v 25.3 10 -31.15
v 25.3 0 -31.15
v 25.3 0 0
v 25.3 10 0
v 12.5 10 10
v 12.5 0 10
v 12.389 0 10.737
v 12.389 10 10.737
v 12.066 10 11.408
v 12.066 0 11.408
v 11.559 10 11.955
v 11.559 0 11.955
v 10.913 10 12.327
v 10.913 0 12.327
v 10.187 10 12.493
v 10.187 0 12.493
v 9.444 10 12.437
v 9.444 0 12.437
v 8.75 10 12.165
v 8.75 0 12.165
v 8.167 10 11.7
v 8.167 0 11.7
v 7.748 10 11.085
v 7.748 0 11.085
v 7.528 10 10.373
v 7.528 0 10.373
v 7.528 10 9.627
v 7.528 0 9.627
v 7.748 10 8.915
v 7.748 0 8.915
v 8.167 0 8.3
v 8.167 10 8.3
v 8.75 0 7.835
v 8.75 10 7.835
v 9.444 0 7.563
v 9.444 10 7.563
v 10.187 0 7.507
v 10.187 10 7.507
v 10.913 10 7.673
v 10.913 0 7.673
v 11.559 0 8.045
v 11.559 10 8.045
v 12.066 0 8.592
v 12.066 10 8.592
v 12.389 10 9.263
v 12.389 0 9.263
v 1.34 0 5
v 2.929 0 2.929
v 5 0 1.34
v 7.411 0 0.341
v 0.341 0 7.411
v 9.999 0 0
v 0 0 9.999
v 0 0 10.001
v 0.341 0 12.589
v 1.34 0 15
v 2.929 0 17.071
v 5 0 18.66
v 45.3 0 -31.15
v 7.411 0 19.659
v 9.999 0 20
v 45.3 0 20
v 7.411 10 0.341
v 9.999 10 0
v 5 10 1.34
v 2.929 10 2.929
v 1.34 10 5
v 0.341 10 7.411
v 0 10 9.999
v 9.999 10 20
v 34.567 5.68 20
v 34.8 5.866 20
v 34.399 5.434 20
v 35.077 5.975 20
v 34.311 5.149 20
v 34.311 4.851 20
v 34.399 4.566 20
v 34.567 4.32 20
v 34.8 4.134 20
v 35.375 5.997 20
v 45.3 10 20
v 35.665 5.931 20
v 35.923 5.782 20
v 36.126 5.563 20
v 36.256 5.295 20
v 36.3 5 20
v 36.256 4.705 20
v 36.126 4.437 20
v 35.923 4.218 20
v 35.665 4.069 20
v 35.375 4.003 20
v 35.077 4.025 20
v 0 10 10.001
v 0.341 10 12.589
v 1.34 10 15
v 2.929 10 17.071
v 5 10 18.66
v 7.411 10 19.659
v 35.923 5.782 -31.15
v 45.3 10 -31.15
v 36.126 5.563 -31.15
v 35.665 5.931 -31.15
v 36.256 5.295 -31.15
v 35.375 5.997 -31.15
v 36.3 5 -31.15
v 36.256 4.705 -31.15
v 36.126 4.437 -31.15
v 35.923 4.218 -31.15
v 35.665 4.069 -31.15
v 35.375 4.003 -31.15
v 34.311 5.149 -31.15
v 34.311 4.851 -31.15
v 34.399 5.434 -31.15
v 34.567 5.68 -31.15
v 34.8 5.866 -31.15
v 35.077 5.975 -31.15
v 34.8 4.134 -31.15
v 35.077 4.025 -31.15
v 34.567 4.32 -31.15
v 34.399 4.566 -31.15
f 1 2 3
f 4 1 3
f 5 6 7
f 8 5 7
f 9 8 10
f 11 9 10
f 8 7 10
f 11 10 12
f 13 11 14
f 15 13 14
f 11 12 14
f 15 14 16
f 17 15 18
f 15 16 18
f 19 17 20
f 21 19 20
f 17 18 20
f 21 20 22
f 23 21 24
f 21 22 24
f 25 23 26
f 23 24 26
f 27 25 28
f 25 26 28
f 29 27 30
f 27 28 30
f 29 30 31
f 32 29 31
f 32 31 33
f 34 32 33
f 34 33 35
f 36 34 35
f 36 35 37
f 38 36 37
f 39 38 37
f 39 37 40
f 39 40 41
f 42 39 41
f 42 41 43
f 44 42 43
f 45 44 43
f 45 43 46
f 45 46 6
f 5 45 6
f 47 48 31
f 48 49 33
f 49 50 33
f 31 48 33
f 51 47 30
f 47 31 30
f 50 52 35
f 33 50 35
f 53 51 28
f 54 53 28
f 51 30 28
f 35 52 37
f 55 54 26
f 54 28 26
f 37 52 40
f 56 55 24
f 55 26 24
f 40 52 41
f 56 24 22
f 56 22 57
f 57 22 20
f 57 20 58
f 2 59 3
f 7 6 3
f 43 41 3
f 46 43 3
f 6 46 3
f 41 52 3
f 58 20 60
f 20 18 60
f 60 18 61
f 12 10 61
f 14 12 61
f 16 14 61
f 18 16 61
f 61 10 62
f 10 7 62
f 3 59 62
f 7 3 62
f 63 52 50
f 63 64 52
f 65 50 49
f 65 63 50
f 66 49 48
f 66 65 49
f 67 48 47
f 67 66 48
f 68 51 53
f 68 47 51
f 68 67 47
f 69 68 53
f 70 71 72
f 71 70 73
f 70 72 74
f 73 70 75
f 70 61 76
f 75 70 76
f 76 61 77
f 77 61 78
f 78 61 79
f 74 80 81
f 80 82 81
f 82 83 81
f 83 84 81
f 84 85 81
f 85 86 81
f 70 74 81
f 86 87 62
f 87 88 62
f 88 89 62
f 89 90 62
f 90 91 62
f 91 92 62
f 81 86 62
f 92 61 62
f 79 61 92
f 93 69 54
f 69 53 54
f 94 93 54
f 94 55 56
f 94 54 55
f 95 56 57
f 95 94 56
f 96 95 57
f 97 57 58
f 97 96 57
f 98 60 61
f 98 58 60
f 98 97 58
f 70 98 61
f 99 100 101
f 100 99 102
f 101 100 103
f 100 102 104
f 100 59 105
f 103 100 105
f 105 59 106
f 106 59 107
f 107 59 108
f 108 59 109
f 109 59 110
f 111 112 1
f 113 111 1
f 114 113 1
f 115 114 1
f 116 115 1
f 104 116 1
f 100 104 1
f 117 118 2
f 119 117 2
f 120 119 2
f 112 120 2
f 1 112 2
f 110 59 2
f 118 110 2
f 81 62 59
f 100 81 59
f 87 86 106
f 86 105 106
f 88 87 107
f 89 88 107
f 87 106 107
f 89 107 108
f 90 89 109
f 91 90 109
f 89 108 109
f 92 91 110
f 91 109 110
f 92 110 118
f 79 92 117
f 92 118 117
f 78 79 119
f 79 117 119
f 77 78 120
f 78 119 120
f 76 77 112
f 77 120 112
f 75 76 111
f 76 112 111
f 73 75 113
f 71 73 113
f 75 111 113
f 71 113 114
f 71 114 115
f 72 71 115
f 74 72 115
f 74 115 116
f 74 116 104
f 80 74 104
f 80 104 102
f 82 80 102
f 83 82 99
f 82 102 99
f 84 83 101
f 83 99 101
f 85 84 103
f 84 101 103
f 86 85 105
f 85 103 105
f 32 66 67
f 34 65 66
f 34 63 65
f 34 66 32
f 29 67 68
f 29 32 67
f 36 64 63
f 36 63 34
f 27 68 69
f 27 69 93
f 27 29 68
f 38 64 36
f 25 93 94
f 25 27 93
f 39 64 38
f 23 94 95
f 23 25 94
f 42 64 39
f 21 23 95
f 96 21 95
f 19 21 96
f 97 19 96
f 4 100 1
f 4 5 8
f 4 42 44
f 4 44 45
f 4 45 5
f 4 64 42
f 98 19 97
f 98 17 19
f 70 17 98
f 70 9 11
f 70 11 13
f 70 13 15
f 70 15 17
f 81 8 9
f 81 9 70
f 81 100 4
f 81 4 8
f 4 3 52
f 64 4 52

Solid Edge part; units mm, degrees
sketch "Sketch1" plane through (0, 0, 0) normal (0, -1, 0) x (1, 0, 0)
  line L0 (0, 20) -> (45.3, 20)
  line L1 (45.3, 20) -> (45.3, -31.15)
  line L2 (45.3, -31.15) -> (25.3, -31.15)
  line L3 (25.3, -31.15) -> (25.3, 0)
  line L4 (25.3, 0) -> (0, 0)
  line L5 (0, 0) -> (0, 20)
  circle A0 centre (10, 10) radius 2.5
  dimension "D1" = 20
  dimension "D2" = 51.15
  dimension "D3" = 20
  dimension "D4" = 45.3
  dimension "D5" = 5
  dimension "D6" = 10
extrude "Protrusion1" add sketch "Sketch1" against normal blind 10
sketch "Sketch2" plane through (35.3, 5, -31.15) normal (0, 0, -1) x (1, 0, 0)
  circle A0 centre (0, 0) radius 1
extrude "Cutout1" cut sketch "Sketch2" against normal through all
fillet "Redondeo_1" radius 10 2 edges at (0, 5, 20) (0, 5, 0)
